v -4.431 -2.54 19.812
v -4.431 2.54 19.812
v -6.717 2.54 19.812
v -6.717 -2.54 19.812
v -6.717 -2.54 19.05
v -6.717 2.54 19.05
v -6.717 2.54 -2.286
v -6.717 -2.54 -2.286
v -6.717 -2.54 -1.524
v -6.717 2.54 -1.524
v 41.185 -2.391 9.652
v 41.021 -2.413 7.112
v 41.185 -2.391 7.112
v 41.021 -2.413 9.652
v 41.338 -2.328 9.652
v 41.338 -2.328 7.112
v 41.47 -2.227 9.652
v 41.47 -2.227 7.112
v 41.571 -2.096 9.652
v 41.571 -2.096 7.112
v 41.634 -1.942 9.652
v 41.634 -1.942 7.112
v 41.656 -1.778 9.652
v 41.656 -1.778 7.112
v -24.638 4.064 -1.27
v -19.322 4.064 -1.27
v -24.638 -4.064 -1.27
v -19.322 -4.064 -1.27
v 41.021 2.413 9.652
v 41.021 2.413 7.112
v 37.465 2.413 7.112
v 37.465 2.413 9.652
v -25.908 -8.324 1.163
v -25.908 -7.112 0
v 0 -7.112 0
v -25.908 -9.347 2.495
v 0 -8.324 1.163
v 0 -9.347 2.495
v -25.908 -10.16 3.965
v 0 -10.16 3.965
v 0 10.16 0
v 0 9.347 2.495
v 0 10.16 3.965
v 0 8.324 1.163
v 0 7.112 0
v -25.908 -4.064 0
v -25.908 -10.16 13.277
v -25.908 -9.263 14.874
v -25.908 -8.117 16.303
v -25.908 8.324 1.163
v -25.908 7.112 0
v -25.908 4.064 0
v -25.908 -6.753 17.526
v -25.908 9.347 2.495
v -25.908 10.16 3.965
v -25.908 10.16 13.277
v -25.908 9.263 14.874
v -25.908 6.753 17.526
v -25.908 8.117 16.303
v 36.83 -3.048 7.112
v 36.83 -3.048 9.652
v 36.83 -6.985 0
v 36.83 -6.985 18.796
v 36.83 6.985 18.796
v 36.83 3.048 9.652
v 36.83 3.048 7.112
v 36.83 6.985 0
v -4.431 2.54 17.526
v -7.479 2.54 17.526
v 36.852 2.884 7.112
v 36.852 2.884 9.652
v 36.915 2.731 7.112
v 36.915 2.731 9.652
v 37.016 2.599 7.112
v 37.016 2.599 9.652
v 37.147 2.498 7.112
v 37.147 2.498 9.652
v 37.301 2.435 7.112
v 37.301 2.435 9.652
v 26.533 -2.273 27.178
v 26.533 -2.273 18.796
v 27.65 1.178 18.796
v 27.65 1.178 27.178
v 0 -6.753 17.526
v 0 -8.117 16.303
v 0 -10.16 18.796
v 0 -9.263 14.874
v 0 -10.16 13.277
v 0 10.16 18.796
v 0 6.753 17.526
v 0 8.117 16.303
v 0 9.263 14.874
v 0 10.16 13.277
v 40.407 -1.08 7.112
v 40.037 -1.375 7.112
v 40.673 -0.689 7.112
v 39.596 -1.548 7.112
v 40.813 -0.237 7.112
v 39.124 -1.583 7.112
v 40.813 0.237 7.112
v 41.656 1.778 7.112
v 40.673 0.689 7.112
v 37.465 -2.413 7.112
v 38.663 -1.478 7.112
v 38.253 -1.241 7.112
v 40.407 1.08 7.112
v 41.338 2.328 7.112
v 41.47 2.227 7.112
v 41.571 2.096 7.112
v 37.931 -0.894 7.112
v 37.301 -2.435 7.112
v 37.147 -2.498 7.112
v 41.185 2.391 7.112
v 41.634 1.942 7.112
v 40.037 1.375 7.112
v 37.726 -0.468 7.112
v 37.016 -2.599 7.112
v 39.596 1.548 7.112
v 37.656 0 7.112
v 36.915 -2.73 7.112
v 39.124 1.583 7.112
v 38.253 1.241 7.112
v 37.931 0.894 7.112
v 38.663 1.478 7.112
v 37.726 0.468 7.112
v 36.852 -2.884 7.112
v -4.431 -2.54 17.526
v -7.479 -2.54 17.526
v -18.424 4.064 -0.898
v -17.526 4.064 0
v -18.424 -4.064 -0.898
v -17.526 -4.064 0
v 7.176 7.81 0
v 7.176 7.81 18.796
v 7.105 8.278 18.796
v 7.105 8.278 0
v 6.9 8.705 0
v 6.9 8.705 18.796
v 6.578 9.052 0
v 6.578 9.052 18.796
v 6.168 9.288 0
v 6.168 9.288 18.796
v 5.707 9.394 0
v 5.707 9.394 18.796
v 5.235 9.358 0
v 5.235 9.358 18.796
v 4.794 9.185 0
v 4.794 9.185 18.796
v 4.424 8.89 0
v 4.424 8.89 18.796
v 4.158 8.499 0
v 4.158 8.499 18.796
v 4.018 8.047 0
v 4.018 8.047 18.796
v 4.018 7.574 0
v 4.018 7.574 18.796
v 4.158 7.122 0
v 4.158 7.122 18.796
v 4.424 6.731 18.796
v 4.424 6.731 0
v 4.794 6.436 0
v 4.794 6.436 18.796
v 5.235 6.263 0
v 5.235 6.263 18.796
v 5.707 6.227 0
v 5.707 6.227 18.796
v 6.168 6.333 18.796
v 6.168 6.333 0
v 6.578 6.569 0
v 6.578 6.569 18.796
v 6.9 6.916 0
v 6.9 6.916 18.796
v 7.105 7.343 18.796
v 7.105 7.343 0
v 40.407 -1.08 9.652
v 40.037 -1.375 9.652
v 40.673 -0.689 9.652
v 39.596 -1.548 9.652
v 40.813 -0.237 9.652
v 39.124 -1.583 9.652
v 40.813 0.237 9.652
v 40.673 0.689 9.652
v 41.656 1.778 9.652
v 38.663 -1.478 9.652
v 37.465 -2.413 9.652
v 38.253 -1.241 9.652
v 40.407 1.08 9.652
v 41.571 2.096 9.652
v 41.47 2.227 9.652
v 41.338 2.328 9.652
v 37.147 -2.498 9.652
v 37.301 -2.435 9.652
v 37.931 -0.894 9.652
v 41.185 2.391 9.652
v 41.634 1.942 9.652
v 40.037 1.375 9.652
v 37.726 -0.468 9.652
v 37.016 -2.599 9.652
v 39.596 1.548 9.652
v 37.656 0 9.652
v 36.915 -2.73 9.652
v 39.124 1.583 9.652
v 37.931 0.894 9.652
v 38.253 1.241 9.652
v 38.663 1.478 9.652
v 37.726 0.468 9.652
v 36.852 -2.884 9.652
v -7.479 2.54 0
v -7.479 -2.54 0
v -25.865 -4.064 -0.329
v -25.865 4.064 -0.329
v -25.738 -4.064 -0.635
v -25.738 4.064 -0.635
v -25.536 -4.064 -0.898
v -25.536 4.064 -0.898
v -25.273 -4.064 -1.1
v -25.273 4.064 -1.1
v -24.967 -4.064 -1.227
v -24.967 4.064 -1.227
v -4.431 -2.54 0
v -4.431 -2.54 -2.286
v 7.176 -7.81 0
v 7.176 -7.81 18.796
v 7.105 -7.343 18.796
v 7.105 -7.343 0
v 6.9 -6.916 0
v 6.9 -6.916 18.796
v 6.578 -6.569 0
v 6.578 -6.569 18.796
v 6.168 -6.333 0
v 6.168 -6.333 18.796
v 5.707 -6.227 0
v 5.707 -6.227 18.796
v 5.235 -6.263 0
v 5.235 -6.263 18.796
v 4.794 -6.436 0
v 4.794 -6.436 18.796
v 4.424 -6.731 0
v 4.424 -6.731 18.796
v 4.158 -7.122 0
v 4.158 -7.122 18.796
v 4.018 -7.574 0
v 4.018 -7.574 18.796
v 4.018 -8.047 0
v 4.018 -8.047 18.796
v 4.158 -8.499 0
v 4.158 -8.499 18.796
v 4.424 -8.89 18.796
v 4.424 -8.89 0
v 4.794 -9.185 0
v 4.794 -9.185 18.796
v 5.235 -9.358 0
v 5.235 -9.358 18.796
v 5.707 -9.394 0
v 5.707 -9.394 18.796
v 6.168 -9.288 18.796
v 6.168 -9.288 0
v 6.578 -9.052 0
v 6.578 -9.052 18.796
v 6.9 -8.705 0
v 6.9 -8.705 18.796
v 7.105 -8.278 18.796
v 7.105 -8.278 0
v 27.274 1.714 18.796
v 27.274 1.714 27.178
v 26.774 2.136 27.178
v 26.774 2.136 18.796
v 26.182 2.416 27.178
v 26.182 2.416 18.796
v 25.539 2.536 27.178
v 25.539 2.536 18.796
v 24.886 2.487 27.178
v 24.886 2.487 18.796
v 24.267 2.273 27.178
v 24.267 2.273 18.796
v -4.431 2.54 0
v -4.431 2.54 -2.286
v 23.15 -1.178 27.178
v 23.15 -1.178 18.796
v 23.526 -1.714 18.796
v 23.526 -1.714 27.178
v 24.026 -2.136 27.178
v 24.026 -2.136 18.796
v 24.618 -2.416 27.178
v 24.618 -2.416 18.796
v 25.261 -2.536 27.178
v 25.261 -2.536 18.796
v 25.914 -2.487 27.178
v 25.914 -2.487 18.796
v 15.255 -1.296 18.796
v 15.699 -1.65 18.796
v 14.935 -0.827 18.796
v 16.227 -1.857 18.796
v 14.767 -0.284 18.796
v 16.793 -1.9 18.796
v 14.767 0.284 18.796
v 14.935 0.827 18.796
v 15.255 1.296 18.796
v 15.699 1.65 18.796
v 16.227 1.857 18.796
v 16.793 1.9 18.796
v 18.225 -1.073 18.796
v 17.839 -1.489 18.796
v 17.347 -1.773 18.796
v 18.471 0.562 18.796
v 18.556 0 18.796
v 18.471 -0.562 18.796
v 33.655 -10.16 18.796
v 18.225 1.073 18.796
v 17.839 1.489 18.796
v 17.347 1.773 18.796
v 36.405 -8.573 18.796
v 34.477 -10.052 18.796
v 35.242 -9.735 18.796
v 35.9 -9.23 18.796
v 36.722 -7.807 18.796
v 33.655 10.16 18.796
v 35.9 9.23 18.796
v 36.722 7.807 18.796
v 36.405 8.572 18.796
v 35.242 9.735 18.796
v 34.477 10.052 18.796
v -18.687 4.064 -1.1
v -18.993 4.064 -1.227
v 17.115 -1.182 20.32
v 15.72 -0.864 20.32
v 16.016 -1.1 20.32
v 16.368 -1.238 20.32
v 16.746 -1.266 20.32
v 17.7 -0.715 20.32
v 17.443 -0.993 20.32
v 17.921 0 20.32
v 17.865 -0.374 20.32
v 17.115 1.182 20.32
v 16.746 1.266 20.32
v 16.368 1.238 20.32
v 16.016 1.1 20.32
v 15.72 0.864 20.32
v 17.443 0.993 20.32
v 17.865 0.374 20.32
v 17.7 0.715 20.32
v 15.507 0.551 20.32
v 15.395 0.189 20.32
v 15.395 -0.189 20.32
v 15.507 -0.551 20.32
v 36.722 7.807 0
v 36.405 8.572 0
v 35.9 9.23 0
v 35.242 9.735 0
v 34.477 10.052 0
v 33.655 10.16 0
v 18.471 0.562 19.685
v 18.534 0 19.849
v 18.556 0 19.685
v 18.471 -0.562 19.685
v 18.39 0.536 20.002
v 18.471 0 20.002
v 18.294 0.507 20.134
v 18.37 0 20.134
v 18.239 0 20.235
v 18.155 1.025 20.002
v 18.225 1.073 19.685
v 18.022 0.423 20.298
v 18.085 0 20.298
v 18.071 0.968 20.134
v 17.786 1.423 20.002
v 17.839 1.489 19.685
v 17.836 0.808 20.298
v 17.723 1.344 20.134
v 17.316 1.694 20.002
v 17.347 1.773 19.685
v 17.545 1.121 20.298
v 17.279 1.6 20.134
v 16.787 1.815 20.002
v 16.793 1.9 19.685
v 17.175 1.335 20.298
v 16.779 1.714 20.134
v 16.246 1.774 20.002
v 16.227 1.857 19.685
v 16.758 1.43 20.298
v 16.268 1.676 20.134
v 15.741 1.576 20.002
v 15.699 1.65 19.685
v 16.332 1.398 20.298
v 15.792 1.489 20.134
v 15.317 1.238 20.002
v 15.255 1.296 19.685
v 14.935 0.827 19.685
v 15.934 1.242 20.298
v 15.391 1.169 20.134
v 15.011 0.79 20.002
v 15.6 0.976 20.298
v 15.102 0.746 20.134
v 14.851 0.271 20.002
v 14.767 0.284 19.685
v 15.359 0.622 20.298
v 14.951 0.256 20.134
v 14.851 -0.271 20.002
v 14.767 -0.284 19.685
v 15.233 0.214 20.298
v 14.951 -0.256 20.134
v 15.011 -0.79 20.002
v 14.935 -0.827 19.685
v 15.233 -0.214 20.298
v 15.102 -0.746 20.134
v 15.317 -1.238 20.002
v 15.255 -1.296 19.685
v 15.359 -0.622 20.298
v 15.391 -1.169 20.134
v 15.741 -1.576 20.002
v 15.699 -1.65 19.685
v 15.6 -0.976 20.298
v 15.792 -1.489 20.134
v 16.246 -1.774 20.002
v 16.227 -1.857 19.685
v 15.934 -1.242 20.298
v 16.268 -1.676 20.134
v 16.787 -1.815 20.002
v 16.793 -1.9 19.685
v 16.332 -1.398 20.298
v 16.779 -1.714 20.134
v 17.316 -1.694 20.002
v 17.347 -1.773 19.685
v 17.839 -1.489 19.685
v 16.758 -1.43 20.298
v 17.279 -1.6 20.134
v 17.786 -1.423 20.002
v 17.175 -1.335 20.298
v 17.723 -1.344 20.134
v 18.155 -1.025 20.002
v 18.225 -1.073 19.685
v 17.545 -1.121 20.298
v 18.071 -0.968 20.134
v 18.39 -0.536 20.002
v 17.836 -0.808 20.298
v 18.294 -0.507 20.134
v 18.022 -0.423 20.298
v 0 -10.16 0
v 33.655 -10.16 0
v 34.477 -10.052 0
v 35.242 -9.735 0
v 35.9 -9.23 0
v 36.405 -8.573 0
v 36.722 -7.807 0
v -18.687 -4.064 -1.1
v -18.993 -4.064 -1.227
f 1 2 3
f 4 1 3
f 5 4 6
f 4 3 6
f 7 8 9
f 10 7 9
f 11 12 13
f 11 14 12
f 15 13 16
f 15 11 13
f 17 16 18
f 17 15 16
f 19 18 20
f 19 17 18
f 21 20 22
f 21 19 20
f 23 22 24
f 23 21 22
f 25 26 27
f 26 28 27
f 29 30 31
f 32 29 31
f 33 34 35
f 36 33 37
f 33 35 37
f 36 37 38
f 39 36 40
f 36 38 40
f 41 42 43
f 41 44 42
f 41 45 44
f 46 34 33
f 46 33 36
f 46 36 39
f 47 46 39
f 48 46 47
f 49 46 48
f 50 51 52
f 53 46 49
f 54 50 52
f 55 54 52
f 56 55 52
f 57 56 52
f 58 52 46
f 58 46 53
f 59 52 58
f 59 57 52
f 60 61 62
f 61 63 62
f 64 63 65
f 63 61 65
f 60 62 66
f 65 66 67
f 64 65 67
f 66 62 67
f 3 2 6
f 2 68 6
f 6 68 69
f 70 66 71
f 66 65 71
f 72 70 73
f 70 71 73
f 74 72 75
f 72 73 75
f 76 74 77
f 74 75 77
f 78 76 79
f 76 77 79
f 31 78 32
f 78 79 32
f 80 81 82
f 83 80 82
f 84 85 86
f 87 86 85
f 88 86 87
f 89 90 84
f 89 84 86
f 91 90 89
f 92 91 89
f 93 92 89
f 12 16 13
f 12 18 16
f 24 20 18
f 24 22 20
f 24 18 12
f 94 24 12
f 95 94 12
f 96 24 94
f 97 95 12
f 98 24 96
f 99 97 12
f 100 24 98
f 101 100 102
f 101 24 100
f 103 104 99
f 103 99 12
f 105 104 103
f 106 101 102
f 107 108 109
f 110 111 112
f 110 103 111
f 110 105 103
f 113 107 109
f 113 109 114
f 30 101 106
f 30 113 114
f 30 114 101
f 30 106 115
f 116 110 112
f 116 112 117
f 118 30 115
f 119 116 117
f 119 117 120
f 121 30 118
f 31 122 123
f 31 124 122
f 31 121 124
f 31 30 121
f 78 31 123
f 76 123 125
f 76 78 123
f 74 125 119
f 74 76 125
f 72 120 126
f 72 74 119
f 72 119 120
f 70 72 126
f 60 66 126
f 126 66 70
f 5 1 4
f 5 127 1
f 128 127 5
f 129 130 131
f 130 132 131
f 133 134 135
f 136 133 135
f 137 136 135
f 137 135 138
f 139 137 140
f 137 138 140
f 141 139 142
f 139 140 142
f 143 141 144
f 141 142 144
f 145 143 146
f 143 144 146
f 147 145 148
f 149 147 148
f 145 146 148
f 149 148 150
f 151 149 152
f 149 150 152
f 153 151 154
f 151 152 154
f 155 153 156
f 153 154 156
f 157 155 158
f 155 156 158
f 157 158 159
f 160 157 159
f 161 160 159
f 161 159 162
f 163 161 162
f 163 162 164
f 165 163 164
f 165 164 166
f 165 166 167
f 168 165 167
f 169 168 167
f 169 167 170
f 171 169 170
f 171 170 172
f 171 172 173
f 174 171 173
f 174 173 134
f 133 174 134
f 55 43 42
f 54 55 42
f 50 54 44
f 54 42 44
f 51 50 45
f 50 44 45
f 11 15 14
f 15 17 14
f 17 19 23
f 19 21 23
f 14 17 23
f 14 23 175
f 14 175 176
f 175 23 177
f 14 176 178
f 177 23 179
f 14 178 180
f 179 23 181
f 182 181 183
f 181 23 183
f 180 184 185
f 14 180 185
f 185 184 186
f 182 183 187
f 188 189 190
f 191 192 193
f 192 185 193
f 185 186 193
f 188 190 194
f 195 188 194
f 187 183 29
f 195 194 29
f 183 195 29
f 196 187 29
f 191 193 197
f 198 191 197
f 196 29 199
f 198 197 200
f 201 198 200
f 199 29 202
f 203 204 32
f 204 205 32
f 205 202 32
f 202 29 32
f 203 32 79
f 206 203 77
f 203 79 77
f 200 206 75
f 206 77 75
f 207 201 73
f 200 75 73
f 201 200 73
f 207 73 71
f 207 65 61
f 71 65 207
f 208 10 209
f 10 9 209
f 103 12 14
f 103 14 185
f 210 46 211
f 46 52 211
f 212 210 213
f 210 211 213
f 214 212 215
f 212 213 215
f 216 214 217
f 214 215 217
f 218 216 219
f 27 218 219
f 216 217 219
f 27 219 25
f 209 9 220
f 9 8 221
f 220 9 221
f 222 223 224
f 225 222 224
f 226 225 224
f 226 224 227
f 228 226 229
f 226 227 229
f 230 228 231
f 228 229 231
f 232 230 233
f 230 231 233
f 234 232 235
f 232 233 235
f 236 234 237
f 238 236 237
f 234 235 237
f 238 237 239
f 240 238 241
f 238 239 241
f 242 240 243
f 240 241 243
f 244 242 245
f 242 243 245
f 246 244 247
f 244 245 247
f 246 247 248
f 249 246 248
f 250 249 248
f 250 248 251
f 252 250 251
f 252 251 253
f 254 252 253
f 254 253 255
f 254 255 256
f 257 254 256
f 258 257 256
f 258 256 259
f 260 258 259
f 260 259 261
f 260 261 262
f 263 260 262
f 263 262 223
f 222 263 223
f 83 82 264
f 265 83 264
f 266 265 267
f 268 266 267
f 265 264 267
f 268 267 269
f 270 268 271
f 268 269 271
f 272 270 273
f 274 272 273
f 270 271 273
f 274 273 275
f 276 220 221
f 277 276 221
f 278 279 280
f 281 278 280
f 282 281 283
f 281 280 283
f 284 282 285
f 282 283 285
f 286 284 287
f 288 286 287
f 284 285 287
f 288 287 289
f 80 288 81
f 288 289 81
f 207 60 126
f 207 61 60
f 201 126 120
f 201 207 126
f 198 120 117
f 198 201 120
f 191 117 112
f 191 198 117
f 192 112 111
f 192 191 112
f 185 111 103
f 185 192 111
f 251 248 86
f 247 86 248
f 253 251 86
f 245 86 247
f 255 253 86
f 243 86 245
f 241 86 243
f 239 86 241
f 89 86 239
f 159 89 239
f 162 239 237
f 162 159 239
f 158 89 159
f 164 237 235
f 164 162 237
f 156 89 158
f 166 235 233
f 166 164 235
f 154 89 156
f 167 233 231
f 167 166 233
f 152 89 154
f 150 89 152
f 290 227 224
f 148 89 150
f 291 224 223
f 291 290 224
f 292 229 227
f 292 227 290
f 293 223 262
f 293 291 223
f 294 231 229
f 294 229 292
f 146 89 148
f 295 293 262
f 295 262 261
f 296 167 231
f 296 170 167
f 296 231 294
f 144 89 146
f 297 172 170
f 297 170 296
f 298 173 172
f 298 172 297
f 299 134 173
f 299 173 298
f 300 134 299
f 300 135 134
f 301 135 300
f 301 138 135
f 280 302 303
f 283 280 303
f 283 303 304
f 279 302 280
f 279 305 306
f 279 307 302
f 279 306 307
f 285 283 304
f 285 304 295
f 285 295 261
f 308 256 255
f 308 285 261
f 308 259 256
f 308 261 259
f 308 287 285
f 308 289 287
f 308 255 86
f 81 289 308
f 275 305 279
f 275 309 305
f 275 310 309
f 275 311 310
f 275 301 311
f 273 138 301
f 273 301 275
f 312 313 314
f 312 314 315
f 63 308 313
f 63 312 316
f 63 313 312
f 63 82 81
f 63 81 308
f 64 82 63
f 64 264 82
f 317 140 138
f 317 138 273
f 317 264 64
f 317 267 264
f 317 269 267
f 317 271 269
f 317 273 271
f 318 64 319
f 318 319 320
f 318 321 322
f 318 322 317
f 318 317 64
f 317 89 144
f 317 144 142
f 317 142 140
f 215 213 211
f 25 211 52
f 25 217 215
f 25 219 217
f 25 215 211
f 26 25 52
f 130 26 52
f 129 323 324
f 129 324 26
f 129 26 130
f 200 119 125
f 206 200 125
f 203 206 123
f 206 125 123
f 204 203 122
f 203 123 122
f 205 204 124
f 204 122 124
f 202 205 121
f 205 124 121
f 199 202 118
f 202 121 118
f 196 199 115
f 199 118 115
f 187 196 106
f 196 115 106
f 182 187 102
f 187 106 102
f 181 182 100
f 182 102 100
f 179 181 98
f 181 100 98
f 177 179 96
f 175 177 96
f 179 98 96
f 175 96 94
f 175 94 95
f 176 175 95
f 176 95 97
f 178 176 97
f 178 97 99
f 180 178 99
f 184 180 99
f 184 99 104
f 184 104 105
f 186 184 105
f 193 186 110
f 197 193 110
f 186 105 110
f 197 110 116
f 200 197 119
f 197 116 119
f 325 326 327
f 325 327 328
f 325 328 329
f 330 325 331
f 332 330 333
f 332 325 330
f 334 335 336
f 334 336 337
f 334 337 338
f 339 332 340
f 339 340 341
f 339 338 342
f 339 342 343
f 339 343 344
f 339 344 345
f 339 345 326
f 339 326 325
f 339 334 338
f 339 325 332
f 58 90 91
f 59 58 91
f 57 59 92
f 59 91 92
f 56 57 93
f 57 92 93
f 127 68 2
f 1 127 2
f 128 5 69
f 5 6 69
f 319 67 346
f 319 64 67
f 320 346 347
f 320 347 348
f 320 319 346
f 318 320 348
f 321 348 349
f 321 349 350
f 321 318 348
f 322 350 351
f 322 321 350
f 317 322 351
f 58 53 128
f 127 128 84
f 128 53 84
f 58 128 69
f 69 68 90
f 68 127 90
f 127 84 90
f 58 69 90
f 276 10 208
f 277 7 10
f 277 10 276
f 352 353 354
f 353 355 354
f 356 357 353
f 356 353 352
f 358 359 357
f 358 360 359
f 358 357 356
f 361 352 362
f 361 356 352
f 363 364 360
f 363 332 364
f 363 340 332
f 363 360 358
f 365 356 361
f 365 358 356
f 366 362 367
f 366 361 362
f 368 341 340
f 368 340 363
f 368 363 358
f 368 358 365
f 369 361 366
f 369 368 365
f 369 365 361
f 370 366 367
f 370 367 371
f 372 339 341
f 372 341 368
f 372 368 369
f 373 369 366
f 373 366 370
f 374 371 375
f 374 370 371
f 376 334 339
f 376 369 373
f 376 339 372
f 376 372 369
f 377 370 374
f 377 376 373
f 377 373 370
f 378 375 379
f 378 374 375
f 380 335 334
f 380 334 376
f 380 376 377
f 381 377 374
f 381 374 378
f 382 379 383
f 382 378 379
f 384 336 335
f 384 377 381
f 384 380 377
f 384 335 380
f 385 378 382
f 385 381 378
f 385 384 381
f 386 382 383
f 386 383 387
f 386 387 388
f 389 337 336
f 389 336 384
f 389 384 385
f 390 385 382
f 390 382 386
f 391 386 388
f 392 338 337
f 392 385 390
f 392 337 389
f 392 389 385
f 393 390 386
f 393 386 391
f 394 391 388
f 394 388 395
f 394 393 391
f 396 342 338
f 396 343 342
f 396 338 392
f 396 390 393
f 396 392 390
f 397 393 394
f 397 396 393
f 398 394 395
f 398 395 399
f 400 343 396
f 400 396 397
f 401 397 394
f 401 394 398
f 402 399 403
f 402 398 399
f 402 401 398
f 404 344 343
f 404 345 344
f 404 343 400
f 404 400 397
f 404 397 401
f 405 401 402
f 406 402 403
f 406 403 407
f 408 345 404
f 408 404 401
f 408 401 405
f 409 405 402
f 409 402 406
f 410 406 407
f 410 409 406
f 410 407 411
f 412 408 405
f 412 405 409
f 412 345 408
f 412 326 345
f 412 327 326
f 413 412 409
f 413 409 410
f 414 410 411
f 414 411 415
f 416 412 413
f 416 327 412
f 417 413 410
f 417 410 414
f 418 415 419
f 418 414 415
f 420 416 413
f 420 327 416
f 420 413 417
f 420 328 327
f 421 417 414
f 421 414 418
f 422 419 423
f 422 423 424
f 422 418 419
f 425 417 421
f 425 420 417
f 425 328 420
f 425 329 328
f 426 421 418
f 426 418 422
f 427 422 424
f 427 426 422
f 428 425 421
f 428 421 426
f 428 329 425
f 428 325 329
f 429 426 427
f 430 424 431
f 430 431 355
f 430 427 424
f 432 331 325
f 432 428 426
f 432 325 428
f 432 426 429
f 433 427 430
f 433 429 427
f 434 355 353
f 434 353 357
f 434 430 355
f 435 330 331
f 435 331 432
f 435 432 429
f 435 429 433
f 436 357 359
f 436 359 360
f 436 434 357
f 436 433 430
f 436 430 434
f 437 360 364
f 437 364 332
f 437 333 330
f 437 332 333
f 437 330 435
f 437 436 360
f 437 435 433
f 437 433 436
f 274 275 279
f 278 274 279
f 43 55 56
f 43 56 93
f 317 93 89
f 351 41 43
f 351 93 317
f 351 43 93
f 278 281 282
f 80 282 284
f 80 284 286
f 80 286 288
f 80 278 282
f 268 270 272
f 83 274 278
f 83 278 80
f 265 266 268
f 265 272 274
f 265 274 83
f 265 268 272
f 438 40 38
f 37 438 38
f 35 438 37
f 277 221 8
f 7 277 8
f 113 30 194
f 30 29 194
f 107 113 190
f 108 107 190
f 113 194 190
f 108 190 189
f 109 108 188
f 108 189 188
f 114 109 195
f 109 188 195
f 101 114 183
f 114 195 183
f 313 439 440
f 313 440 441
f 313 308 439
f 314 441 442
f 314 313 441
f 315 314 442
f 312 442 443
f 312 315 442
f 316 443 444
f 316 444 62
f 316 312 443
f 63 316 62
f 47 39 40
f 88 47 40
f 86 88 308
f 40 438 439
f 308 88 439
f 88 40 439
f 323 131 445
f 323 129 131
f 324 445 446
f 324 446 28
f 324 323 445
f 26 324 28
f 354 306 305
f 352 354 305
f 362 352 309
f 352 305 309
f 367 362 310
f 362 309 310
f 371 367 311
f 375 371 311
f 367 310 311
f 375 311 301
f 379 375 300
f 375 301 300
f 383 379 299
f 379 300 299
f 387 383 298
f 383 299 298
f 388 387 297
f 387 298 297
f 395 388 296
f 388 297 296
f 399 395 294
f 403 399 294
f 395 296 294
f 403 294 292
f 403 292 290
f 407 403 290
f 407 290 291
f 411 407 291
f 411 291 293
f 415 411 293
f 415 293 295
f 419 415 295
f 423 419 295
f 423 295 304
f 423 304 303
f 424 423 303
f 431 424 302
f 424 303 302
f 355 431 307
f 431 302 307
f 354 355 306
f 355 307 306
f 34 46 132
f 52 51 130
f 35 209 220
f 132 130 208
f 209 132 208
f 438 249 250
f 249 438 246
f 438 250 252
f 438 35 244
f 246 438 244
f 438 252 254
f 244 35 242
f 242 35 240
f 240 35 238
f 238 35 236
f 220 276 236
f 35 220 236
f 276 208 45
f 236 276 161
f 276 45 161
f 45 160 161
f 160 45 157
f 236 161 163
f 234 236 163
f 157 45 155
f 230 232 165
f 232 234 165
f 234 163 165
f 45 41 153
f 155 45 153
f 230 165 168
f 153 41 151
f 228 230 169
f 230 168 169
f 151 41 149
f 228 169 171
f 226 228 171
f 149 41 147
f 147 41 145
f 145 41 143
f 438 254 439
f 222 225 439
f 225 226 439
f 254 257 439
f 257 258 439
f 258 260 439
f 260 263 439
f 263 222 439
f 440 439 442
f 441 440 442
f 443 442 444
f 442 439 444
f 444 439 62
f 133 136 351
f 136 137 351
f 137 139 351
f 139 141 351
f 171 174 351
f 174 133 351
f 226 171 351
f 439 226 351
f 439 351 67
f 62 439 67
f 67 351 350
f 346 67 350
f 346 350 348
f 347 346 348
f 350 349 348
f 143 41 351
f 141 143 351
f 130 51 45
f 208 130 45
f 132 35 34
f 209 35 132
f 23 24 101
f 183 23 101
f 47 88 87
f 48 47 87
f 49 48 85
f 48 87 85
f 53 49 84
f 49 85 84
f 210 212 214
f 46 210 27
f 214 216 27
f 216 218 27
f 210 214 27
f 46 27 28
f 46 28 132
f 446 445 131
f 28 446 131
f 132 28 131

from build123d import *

# Parameters (mm, degrees)
SKETCH1_W           = 36.83
SKETCH1_H           = 20.32
BOSS_EXTRUDE1_DEPTH = 18.796
FILLET1_R           = 3.175
BOSS_EXTRUDE2_DEPTH = 25.908
BOSS_EXTRUDE3_DEPTH = 8.382
SKETCH4_R           = 1.5875
CUT_EXTRUDE1_DEPTH  = 19.796
BOSS_EXTRUDE4_START = -7.112
SKETCH5_W           = 4.826
SKETCH5_H           = 4.826
SKETCH5_R           = 1.5875
BOSS_EXTRUDE4_DEPTH = 2.54
FILLET2_R           = 0.635
BOSS_EXTRUDE5_DEPTH = 2.54
BOSS_EXTRUDE6_DEPTH = 4.064
FILLET3_R           = 1.27
SKETCH8_R           = 1.905
BOSS_EXTRUDE7_DEPTH = 1.524
FILLET4_R           = 0.635


with BuildPart() as part:
    # Sketch1 → Boss-Extrude1 (new body)
    with BuildSketch(Plane.XY):
        with Locations((18.415, 0)):
            Rectangle(SKETCH1_W, SKETCH1_H)
    extrude(amount=BOSS_EXTRUDE1_DEPTH)

    # Fillet1
    fillet1_edges = [part.edges().sort_by_distance(p)[0] for p in [
        (36.83, 10.16, 9.398),
        (36.83, -10.16, 9.398),
    ]]
    fillet(fillet1_edges, radius=FILLET1_R)

    # Sketch2 → Boss-Extrude2 (add)
    with BuildSketch(Plane.ZY):
        with BuildLine():
            ThreePointArc((3.96514897, 10.16), (1.809887501, 8.860648824), (0, 7.112))
            Line((0, 7.112), (0, -7.112))
            ThreePointArc((0, -7.112), (1.809887501, -8.860648824), (3.96514897, -10.16))
            Line((3.96514897, -10.16), (13.276942782, -10.16))
            ThreePointArc((13.276942782, -10.16), (15.61217315, -8.719352926), (17.526, -6.753130241))
            Line((17.526, -6.753130241), (17.526, 6.753130241))
            ThreePointArc((17.526, 6.753130241), (15.61217315, 8.719352926), (13.276942782, 10.16))
            Line((13.276942782, 10.16), (3.96514897, 10.16))
        make_face()
    extrude(amount=BOSS_EXTRUDE2_DEPTH)

    # Sketch3 → Boss-Extrude3 (add)
    with BuildSketch(Plane.XY.offset(18.796)):
        with BuildLine():
            Line((24.267261803, 2.273434446), (23.149675051, -1.177980315))
            ThreePointArc((23.149675051, -1.177980315), (24.617532764, -2.416473676), (26.532738197, -2.273434446))
            Line((26.532738197, -2.273434446), (27.650324949, 1.177980315))
            ThreePointArc((27.650324949, 1.177980315), (26.182467236, 2.416473676), (24.267261803, 2.273434446))
        make_face()
    extrude(amount=BOSS_EXTRUDE3_DEPTH)

    # Sketch4 → Cut-Extrude1 (cut, through all)
    with BuildSketch(Plane.XY.offset(18.796)):
        with Locations((5.588, 7.8105)):
            Circle(SKETCH4_R)
        with Locations((5.588, -7.8105)):
            Circle(SKETCH4_R)
    extrude(amount=-CUT_EXTRUDE1_DEPTH, mode=Mode.SUBTRACT)

    # Sketch5 → Boss-Extrude4 (add)
    with BuildSketch(Plane(origin=(0, 0, 0), x_dir=(-1, 0, 0), z_dir=(0, 0, -1)).offset(BOSS_EXTRUDE4_START)):
        with Locations((-39.243, 0)):
            Rectangle(SKETCH5_W, SKETCH5_H)
        with Locations((-39.243, 0)):
            Circle(SKETCH5_R, mode=Mode.SUBTRACT)
    extrude(amount=-BOSS_EXTRUDE4_DEPTH)

    # Fillet2
    fillet2_edges = [part.edges().sort_by_distance(p)[0] for p in [
        (41.656, 2.413, 8.382),
        (36.83, 2.413, 8.382),
        (36.83, -2.413, 8.382),
        (41.656, -2.413, 8.382),
    ]]
    fillet(fillet2_edges, radius=FILLET2_R)

    # Sketch6 → Boss-Extrude5 (add, symmetric)
    with BuildSketch(Plane(origin=(0, 0, 0), x_dir=(-1, 0, 0), z_dir=(0, -1, 0))):
        Polygon((4.430989114, -19.812), (6.716989114, -19.812), (6.716989114, -19.05), (7.478989114, -17.526), (4.430989114, -17.526), align=None)
        Polygon((6.716989114, 2.286), (6.716989114, 1.524), (7.478989114, 0), (4.430989114, 0), (4.430989114, 2.286), align=None)
    extrude(amount=BOSS_EXTRUDE5_DEPTH, both=True)

    # Sketch6<3> → Boss-Extrude6 (add, symmetric)
    with BuildSketch(Plane(origin=(0, 0, 0), x_dir=(-1, 0, 0), z_dir=(0, -1, 0))):
        Polygon((17.526, 0), (18.796, 1.27), (25.908, 1.27), (25.908, 0), align=None)
    extrude(amount=BOSS_EXTRUDE6_DEPTH, both=True)

    # Fillet3
    fillet3_edges = [part.edges().sort_by_distance(p)[0] for p in [
        (-25.908, 0, -1.27),
        (-18.796, 0, -1.27),
    ]]
    fillet(fillet3_edges, radius=FILLET3_R)

    # Sketch8 → Boss-Extrude7 (add)
    with BuildSketch(Plane.XY.offset(18.796)):
        with Locations((16.651010886, 0)):
            Circle(SKETCH8_R)
    extrude(amount=BOSS_EXTRUDE7_DEPTH)

    # Fillet4
    fillet4_edges = [part.edges().sort_by_distance(p)[0] for p in [
        (14.746010886, 0, 20.32),
    ]]
    fillet(fillet4_edges, radius=FILLET4_R)


solid = part.part
